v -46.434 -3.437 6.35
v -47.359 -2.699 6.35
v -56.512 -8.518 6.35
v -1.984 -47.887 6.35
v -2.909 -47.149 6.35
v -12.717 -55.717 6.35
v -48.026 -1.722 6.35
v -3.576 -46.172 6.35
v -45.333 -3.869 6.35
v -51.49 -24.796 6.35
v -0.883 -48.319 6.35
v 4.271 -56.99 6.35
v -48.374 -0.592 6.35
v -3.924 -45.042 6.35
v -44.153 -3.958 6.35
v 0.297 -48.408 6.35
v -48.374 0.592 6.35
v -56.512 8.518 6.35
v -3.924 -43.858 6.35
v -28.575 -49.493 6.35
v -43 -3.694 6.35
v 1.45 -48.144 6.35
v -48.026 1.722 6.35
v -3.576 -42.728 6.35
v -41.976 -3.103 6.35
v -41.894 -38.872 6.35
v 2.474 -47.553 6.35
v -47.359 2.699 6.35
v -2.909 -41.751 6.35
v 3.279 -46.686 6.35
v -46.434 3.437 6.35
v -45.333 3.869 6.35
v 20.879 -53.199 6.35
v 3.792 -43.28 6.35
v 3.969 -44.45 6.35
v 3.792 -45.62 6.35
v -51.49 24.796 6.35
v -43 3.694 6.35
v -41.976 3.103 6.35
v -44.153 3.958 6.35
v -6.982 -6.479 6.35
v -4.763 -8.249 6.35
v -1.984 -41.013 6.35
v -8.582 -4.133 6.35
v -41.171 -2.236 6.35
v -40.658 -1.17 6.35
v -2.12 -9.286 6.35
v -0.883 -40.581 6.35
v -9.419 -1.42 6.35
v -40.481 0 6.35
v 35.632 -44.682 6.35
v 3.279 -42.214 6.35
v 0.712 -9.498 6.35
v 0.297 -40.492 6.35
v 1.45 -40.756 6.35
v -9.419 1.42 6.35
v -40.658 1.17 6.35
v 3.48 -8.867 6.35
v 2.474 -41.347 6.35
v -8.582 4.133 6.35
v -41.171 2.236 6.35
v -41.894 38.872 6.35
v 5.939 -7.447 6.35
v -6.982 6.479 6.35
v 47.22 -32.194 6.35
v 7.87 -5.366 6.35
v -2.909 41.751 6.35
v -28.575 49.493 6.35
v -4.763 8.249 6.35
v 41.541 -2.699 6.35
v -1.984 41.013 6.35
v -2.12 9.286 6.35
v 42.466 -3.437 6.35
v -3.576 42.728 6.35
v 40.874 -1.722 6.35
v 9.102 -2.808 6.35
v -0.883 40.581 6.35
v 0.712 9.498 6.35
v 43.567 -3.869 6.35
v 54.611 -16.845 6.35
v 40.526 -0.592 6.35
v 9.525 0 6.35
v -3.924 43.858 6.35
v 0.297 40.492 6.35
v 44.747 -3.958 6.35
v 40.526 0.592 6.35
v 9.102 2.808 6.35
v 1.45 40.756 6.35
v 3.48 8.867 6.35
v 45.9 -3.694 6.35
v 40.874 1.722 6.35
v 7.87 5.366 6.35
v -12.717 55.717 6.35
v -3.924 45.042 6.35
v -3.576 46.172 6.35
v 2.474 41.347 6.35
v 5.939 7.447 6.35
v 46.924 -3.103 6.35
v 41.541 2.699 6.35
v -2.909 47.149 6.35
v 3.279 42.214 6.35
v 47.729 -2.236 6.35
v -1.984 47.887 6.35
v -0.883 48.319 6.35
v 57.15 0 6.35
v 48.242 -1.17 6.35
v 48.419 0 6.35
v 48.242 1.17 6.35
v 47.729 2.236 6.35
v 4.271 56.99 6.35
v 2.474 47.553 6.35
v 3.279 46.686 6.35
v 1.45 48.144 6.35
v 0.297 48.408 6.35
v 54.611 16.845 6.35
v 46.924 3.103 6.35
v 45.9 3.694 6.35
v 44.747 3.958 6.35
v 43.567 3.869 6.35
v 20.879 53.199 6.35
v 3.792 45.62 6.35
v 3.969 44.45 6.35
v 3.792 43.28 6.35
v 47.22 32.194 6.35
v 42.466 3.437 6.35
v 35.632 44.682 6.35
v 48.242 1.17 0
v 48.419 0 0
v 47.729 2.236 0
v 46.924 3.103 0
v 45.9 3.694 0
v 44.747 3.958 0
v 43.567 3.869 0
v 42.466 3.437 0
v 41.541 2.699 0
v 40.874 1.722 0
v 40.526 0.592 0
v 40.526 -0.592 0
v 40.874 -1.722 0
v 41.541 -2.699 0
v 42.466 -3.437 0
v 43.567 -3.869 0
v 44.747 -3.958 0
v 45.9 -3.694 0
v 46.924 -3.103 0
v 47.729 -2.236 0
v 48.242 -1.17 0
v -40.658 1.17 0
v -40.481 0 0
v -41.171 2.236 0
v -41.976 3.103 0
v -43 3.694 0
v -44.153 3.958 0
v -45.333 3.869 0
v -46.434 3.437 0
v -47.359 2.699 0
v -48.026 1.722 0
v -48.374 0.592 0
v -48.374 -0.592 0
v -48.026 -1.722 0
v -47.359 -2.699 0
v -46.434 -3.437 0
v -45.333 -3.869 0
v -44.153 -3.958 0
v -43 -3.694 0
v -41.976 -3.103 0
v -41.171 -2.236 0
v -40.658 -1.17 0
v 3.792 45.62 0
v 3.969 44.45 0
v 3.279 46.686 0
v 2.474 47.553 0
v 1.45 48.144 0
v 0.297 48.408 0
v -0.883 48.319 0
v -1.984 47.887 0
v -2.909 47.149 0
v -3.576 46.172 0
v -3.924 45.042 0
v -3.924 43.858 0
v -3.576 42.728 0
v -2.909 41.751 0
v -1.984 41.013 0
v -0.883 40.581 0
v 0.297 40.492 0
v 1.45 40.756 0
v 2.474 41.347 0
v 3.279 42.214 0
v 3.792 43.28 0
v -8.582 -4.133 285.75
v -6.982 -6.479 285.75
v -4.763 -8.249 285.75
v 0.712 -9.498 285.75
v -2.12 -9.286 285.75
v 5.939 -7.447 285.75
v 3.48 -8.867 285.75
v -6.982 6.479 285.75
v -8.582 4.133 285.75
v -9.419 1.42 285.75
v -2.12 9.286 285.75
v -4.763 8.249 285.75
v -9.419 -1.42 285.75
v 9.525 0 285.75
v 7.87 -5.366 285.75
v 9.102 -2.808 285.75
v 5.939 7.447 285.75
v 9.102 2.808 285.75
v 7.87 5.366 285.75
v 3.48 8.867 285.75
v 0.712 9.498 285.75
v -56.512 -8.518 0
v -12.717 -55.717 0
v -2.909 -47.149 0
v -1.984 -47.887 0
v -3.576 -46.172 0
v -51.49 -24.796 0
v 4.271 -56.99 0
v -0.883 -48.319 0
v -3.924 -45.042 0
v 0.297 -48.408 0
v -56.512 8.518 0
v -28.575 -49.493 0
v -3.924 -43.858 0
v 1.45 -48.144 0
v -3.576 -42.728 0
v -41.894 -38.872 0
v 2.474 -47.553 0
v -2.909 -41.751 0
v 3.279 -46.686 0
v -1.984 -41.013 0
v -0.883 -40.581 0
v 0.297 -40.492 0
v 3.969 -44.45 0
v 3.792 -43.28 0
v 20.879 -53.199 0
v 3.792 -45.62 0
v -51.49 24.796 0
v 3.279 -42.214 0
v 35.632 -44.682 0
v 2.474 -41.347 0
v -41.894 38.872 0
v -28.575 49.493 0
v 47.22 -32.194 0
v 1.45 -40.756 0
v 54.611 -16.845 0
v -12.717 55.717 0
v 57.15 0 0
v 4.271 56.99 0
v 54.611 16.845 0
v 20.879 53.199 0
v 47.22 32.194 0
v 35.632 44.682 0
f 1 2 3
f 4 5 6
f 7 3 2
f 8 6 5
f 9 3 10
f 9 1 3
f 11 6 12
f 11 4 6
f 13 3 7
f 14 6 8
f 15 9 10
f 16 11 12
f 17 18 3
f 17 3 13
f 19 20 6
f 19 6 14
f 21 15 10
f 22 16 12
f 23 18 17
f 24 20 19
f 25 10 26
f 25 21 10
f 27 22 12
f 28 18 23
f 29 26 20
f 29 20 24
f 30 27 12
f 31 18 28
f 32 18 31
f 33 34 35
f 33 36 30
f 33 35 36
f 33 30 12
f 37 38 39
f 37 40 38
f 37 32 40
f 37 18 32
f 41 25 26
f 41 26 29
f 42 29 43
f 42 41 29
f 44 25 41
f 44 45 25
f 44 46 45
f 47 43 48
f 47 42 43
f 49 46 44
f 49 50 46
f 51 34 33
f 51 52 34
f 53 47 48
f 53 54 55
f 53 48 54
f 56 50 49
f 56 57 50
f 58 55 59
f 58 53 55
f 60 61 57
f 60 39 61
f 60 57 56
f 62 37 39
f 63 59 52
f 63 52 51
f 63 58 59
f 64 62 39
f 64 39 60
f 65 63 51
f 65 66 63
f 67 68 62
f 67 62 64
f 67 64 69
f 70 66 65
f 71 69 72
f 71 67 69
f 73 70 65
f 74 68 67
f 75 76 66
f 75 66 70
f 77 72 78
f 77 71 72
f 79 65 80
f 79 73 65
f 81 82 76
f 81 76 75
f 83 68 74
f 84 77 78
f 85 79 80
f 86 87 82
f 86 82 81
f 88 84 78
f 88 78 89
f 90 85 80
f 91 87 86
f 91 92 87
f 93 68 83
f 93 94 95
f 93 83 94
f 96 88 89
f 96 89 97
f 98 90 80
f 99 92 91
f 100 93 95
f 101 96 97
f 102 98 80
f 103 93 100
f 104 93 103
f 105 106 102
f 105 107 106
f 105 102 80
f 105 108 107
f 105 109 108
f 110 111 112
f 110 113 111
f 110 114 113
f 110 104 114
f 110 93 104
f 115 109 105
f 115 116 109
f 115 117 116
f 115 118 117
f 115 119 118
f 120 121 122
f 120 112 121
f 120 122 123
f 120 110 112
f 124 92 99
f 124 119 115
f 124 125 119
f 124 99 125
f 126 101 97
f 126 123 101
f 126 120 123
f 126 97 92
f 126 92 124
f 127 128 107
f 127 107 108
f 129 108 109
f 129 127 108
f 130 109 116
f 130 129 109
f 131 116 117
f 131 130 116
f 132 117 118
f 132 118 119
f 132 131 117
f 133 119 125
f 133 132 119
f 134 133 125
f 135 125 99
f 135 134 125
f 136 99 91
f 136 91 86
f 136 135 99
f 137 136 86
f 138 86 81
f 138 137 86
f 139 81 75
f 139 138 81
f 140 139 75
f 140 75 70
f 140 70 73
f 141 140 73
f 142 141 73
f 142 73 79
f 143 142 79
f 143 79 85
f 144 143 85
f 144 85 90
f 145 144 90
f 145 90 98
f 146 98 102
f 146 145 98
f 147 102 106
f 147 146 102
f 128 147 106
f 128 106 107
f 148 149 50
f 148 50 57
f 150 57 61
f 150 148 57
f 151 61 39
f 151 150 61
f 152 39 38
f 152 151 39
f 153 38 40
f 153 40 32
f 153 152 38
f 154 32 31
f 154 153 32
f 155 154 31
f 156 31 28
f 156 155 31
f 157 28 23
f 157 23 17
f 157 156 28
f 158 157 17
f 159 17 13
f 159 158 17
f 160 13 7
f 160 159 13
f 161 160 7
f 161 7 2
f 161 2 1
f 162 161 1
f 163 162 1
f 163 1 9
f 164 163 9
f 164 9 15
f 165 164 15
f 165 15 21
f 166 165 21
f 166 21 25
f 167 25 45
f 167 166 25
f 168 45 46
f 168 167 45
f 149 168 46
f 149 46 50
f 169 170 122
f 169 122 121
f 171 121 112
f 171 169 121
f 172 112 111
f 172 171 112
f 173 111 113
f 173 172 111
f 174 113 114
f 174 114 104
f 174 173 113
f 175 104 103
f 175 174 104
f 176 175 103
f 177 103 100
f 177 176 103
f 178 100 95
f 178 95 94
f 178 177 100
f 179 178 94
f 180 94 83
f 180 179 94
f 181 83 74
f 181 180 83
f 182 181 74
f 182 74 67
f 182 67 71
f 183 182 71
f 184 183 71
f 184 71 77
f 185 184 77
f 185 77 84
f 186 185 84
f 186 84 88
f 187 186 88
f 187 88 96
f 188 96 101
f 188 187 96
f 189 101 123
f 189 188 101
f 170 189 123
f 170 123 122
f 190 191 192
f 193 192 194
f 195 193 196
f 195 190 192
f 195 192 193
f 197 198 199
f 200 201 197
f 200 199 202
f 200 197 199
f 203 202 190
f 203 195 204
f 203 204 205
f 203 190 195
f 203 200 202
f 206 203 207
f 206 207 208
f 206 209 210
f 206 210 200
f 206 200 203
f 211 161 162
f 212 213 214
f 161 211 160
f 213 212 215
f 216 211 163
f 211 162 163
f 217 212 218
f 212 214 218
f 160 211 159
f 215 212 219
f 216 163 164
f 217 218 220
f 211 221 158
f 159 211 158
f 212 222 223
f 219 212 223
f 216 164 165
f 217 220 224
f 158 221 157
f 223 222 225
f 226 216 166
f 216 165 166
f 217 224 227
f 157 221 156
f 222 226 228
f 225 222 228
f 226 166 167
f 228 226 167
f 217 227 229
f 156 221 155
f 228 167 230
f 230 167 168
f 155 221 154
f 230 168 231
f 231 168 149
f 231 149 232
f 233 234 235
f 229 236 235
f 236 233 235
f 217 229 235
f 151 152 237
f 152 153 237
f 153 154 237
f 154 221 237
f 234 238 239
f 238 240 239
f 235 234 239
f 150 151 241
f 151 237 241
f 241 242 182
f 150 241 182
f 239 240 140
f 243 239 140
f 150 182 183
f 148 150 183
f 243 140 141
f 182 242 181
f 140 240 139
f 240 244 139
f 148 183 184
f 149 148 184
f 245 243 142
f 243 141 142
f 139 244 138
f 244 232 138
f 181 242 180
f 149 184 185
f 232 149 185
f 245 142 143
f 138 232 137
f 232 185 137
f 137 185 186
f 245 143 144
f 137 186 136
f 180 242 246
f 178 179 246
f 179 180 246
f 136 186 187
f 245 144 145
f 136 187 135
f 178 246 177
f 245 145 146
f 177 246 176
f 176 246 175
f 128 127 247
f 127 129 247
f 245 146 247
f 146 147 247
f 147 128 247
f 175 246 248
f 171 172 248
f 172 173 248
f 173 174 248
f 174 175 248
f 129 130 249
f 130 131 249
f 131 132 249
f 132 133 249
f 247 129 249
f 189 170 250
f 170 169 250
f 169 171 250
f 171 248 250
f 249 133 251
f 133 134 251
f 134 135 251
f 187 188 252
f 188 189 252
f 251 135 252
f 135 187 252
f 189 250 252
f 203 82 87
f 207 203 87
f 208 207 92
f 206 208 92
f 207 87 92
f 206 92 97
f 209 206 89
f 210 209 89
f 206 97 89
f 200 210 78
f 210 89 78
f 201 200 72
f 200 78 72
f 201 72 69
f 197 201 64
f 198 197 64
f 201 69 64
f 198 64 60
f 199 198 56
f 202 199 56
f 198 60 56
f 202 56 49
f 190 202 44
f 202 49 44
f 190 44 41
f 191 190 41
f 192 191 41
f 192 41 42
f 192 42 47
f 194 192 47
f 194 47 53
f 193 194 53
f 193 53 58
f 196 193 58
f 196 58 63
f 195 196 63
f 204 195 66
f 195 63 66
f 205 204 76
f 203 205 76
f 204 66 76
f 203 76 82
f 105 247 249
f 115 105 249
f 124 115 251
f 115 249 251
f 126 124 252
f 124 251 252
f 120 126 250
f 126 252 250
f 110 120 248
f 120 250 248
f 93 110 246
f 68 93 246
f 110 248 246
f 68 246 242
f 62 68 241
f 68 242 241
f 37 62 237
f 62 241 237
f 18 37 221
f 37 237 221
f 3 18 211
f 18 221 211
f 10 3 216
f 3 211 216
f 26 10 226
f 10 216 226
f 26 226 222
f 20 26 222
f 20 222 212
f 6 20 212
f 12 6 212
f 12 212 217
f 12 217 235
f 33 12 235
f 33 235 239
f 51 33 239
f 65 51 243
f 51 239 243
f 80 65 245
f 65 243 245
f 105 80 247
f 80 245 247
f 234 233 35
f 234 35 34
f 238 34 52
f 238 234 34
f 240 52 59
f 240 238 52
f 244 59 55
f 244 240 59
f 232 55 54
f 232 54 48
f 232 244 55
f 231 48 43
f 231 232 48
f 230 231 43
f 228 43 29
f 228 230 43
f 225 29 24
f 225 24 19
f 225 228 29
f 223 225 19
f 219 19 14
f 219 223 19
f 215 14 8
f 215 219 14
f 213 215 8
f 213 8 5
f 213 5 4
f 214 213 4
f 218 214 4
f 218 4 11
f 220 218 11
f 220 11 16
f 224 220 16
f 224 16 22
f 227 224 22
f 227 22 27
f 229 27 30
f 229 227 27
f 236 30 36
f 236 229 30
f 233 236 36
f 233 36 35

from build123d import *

# Parameters (mm, degrees)
SKETCH1_R           = 57.15
SKETCH1_R_2         = 3.96875
BOSS_EXTRUDE1_DEPTH = 6.35
SKETCH2_R           = 9.525
BOSS_EXTRUDE2_DEPTH = 279.4


with BuildPart() as part:
    # Sketch1 → Boss-Extrude1 (new body)
    with BuildSketch(Plane.XY):
        Circle(SKETCH1_R)
        with Locations((0, 44.45)):
            Circle(SKETCH1_R_2, mode=Mode.SUBTRACT)
        with Locations((44.45, 0)):
            Circle(SKETCH1_R_2, mode=Mode.SUBTRACT)
        with Locations((0, -44.45)):
            Circle(SKETCH1_R_2, mode=Mode.SUBTRACT)
        with Locations((-44.45, 0)):
            Circle(SKETCH1_R_2, mode=Mode.SUBTRACT)
    extrude(amount=BOSS_EXTRUDE1_DEPTH)

    # Sketch2 → Boss-Extrude2 (add)
    with BuildSketch(Plane.XY.offset(6.35)):
        Circle(SKETCH2_R)
    extrude(amount=BOSS_EXTRUDE2_DEPTH)


solid = part.part
